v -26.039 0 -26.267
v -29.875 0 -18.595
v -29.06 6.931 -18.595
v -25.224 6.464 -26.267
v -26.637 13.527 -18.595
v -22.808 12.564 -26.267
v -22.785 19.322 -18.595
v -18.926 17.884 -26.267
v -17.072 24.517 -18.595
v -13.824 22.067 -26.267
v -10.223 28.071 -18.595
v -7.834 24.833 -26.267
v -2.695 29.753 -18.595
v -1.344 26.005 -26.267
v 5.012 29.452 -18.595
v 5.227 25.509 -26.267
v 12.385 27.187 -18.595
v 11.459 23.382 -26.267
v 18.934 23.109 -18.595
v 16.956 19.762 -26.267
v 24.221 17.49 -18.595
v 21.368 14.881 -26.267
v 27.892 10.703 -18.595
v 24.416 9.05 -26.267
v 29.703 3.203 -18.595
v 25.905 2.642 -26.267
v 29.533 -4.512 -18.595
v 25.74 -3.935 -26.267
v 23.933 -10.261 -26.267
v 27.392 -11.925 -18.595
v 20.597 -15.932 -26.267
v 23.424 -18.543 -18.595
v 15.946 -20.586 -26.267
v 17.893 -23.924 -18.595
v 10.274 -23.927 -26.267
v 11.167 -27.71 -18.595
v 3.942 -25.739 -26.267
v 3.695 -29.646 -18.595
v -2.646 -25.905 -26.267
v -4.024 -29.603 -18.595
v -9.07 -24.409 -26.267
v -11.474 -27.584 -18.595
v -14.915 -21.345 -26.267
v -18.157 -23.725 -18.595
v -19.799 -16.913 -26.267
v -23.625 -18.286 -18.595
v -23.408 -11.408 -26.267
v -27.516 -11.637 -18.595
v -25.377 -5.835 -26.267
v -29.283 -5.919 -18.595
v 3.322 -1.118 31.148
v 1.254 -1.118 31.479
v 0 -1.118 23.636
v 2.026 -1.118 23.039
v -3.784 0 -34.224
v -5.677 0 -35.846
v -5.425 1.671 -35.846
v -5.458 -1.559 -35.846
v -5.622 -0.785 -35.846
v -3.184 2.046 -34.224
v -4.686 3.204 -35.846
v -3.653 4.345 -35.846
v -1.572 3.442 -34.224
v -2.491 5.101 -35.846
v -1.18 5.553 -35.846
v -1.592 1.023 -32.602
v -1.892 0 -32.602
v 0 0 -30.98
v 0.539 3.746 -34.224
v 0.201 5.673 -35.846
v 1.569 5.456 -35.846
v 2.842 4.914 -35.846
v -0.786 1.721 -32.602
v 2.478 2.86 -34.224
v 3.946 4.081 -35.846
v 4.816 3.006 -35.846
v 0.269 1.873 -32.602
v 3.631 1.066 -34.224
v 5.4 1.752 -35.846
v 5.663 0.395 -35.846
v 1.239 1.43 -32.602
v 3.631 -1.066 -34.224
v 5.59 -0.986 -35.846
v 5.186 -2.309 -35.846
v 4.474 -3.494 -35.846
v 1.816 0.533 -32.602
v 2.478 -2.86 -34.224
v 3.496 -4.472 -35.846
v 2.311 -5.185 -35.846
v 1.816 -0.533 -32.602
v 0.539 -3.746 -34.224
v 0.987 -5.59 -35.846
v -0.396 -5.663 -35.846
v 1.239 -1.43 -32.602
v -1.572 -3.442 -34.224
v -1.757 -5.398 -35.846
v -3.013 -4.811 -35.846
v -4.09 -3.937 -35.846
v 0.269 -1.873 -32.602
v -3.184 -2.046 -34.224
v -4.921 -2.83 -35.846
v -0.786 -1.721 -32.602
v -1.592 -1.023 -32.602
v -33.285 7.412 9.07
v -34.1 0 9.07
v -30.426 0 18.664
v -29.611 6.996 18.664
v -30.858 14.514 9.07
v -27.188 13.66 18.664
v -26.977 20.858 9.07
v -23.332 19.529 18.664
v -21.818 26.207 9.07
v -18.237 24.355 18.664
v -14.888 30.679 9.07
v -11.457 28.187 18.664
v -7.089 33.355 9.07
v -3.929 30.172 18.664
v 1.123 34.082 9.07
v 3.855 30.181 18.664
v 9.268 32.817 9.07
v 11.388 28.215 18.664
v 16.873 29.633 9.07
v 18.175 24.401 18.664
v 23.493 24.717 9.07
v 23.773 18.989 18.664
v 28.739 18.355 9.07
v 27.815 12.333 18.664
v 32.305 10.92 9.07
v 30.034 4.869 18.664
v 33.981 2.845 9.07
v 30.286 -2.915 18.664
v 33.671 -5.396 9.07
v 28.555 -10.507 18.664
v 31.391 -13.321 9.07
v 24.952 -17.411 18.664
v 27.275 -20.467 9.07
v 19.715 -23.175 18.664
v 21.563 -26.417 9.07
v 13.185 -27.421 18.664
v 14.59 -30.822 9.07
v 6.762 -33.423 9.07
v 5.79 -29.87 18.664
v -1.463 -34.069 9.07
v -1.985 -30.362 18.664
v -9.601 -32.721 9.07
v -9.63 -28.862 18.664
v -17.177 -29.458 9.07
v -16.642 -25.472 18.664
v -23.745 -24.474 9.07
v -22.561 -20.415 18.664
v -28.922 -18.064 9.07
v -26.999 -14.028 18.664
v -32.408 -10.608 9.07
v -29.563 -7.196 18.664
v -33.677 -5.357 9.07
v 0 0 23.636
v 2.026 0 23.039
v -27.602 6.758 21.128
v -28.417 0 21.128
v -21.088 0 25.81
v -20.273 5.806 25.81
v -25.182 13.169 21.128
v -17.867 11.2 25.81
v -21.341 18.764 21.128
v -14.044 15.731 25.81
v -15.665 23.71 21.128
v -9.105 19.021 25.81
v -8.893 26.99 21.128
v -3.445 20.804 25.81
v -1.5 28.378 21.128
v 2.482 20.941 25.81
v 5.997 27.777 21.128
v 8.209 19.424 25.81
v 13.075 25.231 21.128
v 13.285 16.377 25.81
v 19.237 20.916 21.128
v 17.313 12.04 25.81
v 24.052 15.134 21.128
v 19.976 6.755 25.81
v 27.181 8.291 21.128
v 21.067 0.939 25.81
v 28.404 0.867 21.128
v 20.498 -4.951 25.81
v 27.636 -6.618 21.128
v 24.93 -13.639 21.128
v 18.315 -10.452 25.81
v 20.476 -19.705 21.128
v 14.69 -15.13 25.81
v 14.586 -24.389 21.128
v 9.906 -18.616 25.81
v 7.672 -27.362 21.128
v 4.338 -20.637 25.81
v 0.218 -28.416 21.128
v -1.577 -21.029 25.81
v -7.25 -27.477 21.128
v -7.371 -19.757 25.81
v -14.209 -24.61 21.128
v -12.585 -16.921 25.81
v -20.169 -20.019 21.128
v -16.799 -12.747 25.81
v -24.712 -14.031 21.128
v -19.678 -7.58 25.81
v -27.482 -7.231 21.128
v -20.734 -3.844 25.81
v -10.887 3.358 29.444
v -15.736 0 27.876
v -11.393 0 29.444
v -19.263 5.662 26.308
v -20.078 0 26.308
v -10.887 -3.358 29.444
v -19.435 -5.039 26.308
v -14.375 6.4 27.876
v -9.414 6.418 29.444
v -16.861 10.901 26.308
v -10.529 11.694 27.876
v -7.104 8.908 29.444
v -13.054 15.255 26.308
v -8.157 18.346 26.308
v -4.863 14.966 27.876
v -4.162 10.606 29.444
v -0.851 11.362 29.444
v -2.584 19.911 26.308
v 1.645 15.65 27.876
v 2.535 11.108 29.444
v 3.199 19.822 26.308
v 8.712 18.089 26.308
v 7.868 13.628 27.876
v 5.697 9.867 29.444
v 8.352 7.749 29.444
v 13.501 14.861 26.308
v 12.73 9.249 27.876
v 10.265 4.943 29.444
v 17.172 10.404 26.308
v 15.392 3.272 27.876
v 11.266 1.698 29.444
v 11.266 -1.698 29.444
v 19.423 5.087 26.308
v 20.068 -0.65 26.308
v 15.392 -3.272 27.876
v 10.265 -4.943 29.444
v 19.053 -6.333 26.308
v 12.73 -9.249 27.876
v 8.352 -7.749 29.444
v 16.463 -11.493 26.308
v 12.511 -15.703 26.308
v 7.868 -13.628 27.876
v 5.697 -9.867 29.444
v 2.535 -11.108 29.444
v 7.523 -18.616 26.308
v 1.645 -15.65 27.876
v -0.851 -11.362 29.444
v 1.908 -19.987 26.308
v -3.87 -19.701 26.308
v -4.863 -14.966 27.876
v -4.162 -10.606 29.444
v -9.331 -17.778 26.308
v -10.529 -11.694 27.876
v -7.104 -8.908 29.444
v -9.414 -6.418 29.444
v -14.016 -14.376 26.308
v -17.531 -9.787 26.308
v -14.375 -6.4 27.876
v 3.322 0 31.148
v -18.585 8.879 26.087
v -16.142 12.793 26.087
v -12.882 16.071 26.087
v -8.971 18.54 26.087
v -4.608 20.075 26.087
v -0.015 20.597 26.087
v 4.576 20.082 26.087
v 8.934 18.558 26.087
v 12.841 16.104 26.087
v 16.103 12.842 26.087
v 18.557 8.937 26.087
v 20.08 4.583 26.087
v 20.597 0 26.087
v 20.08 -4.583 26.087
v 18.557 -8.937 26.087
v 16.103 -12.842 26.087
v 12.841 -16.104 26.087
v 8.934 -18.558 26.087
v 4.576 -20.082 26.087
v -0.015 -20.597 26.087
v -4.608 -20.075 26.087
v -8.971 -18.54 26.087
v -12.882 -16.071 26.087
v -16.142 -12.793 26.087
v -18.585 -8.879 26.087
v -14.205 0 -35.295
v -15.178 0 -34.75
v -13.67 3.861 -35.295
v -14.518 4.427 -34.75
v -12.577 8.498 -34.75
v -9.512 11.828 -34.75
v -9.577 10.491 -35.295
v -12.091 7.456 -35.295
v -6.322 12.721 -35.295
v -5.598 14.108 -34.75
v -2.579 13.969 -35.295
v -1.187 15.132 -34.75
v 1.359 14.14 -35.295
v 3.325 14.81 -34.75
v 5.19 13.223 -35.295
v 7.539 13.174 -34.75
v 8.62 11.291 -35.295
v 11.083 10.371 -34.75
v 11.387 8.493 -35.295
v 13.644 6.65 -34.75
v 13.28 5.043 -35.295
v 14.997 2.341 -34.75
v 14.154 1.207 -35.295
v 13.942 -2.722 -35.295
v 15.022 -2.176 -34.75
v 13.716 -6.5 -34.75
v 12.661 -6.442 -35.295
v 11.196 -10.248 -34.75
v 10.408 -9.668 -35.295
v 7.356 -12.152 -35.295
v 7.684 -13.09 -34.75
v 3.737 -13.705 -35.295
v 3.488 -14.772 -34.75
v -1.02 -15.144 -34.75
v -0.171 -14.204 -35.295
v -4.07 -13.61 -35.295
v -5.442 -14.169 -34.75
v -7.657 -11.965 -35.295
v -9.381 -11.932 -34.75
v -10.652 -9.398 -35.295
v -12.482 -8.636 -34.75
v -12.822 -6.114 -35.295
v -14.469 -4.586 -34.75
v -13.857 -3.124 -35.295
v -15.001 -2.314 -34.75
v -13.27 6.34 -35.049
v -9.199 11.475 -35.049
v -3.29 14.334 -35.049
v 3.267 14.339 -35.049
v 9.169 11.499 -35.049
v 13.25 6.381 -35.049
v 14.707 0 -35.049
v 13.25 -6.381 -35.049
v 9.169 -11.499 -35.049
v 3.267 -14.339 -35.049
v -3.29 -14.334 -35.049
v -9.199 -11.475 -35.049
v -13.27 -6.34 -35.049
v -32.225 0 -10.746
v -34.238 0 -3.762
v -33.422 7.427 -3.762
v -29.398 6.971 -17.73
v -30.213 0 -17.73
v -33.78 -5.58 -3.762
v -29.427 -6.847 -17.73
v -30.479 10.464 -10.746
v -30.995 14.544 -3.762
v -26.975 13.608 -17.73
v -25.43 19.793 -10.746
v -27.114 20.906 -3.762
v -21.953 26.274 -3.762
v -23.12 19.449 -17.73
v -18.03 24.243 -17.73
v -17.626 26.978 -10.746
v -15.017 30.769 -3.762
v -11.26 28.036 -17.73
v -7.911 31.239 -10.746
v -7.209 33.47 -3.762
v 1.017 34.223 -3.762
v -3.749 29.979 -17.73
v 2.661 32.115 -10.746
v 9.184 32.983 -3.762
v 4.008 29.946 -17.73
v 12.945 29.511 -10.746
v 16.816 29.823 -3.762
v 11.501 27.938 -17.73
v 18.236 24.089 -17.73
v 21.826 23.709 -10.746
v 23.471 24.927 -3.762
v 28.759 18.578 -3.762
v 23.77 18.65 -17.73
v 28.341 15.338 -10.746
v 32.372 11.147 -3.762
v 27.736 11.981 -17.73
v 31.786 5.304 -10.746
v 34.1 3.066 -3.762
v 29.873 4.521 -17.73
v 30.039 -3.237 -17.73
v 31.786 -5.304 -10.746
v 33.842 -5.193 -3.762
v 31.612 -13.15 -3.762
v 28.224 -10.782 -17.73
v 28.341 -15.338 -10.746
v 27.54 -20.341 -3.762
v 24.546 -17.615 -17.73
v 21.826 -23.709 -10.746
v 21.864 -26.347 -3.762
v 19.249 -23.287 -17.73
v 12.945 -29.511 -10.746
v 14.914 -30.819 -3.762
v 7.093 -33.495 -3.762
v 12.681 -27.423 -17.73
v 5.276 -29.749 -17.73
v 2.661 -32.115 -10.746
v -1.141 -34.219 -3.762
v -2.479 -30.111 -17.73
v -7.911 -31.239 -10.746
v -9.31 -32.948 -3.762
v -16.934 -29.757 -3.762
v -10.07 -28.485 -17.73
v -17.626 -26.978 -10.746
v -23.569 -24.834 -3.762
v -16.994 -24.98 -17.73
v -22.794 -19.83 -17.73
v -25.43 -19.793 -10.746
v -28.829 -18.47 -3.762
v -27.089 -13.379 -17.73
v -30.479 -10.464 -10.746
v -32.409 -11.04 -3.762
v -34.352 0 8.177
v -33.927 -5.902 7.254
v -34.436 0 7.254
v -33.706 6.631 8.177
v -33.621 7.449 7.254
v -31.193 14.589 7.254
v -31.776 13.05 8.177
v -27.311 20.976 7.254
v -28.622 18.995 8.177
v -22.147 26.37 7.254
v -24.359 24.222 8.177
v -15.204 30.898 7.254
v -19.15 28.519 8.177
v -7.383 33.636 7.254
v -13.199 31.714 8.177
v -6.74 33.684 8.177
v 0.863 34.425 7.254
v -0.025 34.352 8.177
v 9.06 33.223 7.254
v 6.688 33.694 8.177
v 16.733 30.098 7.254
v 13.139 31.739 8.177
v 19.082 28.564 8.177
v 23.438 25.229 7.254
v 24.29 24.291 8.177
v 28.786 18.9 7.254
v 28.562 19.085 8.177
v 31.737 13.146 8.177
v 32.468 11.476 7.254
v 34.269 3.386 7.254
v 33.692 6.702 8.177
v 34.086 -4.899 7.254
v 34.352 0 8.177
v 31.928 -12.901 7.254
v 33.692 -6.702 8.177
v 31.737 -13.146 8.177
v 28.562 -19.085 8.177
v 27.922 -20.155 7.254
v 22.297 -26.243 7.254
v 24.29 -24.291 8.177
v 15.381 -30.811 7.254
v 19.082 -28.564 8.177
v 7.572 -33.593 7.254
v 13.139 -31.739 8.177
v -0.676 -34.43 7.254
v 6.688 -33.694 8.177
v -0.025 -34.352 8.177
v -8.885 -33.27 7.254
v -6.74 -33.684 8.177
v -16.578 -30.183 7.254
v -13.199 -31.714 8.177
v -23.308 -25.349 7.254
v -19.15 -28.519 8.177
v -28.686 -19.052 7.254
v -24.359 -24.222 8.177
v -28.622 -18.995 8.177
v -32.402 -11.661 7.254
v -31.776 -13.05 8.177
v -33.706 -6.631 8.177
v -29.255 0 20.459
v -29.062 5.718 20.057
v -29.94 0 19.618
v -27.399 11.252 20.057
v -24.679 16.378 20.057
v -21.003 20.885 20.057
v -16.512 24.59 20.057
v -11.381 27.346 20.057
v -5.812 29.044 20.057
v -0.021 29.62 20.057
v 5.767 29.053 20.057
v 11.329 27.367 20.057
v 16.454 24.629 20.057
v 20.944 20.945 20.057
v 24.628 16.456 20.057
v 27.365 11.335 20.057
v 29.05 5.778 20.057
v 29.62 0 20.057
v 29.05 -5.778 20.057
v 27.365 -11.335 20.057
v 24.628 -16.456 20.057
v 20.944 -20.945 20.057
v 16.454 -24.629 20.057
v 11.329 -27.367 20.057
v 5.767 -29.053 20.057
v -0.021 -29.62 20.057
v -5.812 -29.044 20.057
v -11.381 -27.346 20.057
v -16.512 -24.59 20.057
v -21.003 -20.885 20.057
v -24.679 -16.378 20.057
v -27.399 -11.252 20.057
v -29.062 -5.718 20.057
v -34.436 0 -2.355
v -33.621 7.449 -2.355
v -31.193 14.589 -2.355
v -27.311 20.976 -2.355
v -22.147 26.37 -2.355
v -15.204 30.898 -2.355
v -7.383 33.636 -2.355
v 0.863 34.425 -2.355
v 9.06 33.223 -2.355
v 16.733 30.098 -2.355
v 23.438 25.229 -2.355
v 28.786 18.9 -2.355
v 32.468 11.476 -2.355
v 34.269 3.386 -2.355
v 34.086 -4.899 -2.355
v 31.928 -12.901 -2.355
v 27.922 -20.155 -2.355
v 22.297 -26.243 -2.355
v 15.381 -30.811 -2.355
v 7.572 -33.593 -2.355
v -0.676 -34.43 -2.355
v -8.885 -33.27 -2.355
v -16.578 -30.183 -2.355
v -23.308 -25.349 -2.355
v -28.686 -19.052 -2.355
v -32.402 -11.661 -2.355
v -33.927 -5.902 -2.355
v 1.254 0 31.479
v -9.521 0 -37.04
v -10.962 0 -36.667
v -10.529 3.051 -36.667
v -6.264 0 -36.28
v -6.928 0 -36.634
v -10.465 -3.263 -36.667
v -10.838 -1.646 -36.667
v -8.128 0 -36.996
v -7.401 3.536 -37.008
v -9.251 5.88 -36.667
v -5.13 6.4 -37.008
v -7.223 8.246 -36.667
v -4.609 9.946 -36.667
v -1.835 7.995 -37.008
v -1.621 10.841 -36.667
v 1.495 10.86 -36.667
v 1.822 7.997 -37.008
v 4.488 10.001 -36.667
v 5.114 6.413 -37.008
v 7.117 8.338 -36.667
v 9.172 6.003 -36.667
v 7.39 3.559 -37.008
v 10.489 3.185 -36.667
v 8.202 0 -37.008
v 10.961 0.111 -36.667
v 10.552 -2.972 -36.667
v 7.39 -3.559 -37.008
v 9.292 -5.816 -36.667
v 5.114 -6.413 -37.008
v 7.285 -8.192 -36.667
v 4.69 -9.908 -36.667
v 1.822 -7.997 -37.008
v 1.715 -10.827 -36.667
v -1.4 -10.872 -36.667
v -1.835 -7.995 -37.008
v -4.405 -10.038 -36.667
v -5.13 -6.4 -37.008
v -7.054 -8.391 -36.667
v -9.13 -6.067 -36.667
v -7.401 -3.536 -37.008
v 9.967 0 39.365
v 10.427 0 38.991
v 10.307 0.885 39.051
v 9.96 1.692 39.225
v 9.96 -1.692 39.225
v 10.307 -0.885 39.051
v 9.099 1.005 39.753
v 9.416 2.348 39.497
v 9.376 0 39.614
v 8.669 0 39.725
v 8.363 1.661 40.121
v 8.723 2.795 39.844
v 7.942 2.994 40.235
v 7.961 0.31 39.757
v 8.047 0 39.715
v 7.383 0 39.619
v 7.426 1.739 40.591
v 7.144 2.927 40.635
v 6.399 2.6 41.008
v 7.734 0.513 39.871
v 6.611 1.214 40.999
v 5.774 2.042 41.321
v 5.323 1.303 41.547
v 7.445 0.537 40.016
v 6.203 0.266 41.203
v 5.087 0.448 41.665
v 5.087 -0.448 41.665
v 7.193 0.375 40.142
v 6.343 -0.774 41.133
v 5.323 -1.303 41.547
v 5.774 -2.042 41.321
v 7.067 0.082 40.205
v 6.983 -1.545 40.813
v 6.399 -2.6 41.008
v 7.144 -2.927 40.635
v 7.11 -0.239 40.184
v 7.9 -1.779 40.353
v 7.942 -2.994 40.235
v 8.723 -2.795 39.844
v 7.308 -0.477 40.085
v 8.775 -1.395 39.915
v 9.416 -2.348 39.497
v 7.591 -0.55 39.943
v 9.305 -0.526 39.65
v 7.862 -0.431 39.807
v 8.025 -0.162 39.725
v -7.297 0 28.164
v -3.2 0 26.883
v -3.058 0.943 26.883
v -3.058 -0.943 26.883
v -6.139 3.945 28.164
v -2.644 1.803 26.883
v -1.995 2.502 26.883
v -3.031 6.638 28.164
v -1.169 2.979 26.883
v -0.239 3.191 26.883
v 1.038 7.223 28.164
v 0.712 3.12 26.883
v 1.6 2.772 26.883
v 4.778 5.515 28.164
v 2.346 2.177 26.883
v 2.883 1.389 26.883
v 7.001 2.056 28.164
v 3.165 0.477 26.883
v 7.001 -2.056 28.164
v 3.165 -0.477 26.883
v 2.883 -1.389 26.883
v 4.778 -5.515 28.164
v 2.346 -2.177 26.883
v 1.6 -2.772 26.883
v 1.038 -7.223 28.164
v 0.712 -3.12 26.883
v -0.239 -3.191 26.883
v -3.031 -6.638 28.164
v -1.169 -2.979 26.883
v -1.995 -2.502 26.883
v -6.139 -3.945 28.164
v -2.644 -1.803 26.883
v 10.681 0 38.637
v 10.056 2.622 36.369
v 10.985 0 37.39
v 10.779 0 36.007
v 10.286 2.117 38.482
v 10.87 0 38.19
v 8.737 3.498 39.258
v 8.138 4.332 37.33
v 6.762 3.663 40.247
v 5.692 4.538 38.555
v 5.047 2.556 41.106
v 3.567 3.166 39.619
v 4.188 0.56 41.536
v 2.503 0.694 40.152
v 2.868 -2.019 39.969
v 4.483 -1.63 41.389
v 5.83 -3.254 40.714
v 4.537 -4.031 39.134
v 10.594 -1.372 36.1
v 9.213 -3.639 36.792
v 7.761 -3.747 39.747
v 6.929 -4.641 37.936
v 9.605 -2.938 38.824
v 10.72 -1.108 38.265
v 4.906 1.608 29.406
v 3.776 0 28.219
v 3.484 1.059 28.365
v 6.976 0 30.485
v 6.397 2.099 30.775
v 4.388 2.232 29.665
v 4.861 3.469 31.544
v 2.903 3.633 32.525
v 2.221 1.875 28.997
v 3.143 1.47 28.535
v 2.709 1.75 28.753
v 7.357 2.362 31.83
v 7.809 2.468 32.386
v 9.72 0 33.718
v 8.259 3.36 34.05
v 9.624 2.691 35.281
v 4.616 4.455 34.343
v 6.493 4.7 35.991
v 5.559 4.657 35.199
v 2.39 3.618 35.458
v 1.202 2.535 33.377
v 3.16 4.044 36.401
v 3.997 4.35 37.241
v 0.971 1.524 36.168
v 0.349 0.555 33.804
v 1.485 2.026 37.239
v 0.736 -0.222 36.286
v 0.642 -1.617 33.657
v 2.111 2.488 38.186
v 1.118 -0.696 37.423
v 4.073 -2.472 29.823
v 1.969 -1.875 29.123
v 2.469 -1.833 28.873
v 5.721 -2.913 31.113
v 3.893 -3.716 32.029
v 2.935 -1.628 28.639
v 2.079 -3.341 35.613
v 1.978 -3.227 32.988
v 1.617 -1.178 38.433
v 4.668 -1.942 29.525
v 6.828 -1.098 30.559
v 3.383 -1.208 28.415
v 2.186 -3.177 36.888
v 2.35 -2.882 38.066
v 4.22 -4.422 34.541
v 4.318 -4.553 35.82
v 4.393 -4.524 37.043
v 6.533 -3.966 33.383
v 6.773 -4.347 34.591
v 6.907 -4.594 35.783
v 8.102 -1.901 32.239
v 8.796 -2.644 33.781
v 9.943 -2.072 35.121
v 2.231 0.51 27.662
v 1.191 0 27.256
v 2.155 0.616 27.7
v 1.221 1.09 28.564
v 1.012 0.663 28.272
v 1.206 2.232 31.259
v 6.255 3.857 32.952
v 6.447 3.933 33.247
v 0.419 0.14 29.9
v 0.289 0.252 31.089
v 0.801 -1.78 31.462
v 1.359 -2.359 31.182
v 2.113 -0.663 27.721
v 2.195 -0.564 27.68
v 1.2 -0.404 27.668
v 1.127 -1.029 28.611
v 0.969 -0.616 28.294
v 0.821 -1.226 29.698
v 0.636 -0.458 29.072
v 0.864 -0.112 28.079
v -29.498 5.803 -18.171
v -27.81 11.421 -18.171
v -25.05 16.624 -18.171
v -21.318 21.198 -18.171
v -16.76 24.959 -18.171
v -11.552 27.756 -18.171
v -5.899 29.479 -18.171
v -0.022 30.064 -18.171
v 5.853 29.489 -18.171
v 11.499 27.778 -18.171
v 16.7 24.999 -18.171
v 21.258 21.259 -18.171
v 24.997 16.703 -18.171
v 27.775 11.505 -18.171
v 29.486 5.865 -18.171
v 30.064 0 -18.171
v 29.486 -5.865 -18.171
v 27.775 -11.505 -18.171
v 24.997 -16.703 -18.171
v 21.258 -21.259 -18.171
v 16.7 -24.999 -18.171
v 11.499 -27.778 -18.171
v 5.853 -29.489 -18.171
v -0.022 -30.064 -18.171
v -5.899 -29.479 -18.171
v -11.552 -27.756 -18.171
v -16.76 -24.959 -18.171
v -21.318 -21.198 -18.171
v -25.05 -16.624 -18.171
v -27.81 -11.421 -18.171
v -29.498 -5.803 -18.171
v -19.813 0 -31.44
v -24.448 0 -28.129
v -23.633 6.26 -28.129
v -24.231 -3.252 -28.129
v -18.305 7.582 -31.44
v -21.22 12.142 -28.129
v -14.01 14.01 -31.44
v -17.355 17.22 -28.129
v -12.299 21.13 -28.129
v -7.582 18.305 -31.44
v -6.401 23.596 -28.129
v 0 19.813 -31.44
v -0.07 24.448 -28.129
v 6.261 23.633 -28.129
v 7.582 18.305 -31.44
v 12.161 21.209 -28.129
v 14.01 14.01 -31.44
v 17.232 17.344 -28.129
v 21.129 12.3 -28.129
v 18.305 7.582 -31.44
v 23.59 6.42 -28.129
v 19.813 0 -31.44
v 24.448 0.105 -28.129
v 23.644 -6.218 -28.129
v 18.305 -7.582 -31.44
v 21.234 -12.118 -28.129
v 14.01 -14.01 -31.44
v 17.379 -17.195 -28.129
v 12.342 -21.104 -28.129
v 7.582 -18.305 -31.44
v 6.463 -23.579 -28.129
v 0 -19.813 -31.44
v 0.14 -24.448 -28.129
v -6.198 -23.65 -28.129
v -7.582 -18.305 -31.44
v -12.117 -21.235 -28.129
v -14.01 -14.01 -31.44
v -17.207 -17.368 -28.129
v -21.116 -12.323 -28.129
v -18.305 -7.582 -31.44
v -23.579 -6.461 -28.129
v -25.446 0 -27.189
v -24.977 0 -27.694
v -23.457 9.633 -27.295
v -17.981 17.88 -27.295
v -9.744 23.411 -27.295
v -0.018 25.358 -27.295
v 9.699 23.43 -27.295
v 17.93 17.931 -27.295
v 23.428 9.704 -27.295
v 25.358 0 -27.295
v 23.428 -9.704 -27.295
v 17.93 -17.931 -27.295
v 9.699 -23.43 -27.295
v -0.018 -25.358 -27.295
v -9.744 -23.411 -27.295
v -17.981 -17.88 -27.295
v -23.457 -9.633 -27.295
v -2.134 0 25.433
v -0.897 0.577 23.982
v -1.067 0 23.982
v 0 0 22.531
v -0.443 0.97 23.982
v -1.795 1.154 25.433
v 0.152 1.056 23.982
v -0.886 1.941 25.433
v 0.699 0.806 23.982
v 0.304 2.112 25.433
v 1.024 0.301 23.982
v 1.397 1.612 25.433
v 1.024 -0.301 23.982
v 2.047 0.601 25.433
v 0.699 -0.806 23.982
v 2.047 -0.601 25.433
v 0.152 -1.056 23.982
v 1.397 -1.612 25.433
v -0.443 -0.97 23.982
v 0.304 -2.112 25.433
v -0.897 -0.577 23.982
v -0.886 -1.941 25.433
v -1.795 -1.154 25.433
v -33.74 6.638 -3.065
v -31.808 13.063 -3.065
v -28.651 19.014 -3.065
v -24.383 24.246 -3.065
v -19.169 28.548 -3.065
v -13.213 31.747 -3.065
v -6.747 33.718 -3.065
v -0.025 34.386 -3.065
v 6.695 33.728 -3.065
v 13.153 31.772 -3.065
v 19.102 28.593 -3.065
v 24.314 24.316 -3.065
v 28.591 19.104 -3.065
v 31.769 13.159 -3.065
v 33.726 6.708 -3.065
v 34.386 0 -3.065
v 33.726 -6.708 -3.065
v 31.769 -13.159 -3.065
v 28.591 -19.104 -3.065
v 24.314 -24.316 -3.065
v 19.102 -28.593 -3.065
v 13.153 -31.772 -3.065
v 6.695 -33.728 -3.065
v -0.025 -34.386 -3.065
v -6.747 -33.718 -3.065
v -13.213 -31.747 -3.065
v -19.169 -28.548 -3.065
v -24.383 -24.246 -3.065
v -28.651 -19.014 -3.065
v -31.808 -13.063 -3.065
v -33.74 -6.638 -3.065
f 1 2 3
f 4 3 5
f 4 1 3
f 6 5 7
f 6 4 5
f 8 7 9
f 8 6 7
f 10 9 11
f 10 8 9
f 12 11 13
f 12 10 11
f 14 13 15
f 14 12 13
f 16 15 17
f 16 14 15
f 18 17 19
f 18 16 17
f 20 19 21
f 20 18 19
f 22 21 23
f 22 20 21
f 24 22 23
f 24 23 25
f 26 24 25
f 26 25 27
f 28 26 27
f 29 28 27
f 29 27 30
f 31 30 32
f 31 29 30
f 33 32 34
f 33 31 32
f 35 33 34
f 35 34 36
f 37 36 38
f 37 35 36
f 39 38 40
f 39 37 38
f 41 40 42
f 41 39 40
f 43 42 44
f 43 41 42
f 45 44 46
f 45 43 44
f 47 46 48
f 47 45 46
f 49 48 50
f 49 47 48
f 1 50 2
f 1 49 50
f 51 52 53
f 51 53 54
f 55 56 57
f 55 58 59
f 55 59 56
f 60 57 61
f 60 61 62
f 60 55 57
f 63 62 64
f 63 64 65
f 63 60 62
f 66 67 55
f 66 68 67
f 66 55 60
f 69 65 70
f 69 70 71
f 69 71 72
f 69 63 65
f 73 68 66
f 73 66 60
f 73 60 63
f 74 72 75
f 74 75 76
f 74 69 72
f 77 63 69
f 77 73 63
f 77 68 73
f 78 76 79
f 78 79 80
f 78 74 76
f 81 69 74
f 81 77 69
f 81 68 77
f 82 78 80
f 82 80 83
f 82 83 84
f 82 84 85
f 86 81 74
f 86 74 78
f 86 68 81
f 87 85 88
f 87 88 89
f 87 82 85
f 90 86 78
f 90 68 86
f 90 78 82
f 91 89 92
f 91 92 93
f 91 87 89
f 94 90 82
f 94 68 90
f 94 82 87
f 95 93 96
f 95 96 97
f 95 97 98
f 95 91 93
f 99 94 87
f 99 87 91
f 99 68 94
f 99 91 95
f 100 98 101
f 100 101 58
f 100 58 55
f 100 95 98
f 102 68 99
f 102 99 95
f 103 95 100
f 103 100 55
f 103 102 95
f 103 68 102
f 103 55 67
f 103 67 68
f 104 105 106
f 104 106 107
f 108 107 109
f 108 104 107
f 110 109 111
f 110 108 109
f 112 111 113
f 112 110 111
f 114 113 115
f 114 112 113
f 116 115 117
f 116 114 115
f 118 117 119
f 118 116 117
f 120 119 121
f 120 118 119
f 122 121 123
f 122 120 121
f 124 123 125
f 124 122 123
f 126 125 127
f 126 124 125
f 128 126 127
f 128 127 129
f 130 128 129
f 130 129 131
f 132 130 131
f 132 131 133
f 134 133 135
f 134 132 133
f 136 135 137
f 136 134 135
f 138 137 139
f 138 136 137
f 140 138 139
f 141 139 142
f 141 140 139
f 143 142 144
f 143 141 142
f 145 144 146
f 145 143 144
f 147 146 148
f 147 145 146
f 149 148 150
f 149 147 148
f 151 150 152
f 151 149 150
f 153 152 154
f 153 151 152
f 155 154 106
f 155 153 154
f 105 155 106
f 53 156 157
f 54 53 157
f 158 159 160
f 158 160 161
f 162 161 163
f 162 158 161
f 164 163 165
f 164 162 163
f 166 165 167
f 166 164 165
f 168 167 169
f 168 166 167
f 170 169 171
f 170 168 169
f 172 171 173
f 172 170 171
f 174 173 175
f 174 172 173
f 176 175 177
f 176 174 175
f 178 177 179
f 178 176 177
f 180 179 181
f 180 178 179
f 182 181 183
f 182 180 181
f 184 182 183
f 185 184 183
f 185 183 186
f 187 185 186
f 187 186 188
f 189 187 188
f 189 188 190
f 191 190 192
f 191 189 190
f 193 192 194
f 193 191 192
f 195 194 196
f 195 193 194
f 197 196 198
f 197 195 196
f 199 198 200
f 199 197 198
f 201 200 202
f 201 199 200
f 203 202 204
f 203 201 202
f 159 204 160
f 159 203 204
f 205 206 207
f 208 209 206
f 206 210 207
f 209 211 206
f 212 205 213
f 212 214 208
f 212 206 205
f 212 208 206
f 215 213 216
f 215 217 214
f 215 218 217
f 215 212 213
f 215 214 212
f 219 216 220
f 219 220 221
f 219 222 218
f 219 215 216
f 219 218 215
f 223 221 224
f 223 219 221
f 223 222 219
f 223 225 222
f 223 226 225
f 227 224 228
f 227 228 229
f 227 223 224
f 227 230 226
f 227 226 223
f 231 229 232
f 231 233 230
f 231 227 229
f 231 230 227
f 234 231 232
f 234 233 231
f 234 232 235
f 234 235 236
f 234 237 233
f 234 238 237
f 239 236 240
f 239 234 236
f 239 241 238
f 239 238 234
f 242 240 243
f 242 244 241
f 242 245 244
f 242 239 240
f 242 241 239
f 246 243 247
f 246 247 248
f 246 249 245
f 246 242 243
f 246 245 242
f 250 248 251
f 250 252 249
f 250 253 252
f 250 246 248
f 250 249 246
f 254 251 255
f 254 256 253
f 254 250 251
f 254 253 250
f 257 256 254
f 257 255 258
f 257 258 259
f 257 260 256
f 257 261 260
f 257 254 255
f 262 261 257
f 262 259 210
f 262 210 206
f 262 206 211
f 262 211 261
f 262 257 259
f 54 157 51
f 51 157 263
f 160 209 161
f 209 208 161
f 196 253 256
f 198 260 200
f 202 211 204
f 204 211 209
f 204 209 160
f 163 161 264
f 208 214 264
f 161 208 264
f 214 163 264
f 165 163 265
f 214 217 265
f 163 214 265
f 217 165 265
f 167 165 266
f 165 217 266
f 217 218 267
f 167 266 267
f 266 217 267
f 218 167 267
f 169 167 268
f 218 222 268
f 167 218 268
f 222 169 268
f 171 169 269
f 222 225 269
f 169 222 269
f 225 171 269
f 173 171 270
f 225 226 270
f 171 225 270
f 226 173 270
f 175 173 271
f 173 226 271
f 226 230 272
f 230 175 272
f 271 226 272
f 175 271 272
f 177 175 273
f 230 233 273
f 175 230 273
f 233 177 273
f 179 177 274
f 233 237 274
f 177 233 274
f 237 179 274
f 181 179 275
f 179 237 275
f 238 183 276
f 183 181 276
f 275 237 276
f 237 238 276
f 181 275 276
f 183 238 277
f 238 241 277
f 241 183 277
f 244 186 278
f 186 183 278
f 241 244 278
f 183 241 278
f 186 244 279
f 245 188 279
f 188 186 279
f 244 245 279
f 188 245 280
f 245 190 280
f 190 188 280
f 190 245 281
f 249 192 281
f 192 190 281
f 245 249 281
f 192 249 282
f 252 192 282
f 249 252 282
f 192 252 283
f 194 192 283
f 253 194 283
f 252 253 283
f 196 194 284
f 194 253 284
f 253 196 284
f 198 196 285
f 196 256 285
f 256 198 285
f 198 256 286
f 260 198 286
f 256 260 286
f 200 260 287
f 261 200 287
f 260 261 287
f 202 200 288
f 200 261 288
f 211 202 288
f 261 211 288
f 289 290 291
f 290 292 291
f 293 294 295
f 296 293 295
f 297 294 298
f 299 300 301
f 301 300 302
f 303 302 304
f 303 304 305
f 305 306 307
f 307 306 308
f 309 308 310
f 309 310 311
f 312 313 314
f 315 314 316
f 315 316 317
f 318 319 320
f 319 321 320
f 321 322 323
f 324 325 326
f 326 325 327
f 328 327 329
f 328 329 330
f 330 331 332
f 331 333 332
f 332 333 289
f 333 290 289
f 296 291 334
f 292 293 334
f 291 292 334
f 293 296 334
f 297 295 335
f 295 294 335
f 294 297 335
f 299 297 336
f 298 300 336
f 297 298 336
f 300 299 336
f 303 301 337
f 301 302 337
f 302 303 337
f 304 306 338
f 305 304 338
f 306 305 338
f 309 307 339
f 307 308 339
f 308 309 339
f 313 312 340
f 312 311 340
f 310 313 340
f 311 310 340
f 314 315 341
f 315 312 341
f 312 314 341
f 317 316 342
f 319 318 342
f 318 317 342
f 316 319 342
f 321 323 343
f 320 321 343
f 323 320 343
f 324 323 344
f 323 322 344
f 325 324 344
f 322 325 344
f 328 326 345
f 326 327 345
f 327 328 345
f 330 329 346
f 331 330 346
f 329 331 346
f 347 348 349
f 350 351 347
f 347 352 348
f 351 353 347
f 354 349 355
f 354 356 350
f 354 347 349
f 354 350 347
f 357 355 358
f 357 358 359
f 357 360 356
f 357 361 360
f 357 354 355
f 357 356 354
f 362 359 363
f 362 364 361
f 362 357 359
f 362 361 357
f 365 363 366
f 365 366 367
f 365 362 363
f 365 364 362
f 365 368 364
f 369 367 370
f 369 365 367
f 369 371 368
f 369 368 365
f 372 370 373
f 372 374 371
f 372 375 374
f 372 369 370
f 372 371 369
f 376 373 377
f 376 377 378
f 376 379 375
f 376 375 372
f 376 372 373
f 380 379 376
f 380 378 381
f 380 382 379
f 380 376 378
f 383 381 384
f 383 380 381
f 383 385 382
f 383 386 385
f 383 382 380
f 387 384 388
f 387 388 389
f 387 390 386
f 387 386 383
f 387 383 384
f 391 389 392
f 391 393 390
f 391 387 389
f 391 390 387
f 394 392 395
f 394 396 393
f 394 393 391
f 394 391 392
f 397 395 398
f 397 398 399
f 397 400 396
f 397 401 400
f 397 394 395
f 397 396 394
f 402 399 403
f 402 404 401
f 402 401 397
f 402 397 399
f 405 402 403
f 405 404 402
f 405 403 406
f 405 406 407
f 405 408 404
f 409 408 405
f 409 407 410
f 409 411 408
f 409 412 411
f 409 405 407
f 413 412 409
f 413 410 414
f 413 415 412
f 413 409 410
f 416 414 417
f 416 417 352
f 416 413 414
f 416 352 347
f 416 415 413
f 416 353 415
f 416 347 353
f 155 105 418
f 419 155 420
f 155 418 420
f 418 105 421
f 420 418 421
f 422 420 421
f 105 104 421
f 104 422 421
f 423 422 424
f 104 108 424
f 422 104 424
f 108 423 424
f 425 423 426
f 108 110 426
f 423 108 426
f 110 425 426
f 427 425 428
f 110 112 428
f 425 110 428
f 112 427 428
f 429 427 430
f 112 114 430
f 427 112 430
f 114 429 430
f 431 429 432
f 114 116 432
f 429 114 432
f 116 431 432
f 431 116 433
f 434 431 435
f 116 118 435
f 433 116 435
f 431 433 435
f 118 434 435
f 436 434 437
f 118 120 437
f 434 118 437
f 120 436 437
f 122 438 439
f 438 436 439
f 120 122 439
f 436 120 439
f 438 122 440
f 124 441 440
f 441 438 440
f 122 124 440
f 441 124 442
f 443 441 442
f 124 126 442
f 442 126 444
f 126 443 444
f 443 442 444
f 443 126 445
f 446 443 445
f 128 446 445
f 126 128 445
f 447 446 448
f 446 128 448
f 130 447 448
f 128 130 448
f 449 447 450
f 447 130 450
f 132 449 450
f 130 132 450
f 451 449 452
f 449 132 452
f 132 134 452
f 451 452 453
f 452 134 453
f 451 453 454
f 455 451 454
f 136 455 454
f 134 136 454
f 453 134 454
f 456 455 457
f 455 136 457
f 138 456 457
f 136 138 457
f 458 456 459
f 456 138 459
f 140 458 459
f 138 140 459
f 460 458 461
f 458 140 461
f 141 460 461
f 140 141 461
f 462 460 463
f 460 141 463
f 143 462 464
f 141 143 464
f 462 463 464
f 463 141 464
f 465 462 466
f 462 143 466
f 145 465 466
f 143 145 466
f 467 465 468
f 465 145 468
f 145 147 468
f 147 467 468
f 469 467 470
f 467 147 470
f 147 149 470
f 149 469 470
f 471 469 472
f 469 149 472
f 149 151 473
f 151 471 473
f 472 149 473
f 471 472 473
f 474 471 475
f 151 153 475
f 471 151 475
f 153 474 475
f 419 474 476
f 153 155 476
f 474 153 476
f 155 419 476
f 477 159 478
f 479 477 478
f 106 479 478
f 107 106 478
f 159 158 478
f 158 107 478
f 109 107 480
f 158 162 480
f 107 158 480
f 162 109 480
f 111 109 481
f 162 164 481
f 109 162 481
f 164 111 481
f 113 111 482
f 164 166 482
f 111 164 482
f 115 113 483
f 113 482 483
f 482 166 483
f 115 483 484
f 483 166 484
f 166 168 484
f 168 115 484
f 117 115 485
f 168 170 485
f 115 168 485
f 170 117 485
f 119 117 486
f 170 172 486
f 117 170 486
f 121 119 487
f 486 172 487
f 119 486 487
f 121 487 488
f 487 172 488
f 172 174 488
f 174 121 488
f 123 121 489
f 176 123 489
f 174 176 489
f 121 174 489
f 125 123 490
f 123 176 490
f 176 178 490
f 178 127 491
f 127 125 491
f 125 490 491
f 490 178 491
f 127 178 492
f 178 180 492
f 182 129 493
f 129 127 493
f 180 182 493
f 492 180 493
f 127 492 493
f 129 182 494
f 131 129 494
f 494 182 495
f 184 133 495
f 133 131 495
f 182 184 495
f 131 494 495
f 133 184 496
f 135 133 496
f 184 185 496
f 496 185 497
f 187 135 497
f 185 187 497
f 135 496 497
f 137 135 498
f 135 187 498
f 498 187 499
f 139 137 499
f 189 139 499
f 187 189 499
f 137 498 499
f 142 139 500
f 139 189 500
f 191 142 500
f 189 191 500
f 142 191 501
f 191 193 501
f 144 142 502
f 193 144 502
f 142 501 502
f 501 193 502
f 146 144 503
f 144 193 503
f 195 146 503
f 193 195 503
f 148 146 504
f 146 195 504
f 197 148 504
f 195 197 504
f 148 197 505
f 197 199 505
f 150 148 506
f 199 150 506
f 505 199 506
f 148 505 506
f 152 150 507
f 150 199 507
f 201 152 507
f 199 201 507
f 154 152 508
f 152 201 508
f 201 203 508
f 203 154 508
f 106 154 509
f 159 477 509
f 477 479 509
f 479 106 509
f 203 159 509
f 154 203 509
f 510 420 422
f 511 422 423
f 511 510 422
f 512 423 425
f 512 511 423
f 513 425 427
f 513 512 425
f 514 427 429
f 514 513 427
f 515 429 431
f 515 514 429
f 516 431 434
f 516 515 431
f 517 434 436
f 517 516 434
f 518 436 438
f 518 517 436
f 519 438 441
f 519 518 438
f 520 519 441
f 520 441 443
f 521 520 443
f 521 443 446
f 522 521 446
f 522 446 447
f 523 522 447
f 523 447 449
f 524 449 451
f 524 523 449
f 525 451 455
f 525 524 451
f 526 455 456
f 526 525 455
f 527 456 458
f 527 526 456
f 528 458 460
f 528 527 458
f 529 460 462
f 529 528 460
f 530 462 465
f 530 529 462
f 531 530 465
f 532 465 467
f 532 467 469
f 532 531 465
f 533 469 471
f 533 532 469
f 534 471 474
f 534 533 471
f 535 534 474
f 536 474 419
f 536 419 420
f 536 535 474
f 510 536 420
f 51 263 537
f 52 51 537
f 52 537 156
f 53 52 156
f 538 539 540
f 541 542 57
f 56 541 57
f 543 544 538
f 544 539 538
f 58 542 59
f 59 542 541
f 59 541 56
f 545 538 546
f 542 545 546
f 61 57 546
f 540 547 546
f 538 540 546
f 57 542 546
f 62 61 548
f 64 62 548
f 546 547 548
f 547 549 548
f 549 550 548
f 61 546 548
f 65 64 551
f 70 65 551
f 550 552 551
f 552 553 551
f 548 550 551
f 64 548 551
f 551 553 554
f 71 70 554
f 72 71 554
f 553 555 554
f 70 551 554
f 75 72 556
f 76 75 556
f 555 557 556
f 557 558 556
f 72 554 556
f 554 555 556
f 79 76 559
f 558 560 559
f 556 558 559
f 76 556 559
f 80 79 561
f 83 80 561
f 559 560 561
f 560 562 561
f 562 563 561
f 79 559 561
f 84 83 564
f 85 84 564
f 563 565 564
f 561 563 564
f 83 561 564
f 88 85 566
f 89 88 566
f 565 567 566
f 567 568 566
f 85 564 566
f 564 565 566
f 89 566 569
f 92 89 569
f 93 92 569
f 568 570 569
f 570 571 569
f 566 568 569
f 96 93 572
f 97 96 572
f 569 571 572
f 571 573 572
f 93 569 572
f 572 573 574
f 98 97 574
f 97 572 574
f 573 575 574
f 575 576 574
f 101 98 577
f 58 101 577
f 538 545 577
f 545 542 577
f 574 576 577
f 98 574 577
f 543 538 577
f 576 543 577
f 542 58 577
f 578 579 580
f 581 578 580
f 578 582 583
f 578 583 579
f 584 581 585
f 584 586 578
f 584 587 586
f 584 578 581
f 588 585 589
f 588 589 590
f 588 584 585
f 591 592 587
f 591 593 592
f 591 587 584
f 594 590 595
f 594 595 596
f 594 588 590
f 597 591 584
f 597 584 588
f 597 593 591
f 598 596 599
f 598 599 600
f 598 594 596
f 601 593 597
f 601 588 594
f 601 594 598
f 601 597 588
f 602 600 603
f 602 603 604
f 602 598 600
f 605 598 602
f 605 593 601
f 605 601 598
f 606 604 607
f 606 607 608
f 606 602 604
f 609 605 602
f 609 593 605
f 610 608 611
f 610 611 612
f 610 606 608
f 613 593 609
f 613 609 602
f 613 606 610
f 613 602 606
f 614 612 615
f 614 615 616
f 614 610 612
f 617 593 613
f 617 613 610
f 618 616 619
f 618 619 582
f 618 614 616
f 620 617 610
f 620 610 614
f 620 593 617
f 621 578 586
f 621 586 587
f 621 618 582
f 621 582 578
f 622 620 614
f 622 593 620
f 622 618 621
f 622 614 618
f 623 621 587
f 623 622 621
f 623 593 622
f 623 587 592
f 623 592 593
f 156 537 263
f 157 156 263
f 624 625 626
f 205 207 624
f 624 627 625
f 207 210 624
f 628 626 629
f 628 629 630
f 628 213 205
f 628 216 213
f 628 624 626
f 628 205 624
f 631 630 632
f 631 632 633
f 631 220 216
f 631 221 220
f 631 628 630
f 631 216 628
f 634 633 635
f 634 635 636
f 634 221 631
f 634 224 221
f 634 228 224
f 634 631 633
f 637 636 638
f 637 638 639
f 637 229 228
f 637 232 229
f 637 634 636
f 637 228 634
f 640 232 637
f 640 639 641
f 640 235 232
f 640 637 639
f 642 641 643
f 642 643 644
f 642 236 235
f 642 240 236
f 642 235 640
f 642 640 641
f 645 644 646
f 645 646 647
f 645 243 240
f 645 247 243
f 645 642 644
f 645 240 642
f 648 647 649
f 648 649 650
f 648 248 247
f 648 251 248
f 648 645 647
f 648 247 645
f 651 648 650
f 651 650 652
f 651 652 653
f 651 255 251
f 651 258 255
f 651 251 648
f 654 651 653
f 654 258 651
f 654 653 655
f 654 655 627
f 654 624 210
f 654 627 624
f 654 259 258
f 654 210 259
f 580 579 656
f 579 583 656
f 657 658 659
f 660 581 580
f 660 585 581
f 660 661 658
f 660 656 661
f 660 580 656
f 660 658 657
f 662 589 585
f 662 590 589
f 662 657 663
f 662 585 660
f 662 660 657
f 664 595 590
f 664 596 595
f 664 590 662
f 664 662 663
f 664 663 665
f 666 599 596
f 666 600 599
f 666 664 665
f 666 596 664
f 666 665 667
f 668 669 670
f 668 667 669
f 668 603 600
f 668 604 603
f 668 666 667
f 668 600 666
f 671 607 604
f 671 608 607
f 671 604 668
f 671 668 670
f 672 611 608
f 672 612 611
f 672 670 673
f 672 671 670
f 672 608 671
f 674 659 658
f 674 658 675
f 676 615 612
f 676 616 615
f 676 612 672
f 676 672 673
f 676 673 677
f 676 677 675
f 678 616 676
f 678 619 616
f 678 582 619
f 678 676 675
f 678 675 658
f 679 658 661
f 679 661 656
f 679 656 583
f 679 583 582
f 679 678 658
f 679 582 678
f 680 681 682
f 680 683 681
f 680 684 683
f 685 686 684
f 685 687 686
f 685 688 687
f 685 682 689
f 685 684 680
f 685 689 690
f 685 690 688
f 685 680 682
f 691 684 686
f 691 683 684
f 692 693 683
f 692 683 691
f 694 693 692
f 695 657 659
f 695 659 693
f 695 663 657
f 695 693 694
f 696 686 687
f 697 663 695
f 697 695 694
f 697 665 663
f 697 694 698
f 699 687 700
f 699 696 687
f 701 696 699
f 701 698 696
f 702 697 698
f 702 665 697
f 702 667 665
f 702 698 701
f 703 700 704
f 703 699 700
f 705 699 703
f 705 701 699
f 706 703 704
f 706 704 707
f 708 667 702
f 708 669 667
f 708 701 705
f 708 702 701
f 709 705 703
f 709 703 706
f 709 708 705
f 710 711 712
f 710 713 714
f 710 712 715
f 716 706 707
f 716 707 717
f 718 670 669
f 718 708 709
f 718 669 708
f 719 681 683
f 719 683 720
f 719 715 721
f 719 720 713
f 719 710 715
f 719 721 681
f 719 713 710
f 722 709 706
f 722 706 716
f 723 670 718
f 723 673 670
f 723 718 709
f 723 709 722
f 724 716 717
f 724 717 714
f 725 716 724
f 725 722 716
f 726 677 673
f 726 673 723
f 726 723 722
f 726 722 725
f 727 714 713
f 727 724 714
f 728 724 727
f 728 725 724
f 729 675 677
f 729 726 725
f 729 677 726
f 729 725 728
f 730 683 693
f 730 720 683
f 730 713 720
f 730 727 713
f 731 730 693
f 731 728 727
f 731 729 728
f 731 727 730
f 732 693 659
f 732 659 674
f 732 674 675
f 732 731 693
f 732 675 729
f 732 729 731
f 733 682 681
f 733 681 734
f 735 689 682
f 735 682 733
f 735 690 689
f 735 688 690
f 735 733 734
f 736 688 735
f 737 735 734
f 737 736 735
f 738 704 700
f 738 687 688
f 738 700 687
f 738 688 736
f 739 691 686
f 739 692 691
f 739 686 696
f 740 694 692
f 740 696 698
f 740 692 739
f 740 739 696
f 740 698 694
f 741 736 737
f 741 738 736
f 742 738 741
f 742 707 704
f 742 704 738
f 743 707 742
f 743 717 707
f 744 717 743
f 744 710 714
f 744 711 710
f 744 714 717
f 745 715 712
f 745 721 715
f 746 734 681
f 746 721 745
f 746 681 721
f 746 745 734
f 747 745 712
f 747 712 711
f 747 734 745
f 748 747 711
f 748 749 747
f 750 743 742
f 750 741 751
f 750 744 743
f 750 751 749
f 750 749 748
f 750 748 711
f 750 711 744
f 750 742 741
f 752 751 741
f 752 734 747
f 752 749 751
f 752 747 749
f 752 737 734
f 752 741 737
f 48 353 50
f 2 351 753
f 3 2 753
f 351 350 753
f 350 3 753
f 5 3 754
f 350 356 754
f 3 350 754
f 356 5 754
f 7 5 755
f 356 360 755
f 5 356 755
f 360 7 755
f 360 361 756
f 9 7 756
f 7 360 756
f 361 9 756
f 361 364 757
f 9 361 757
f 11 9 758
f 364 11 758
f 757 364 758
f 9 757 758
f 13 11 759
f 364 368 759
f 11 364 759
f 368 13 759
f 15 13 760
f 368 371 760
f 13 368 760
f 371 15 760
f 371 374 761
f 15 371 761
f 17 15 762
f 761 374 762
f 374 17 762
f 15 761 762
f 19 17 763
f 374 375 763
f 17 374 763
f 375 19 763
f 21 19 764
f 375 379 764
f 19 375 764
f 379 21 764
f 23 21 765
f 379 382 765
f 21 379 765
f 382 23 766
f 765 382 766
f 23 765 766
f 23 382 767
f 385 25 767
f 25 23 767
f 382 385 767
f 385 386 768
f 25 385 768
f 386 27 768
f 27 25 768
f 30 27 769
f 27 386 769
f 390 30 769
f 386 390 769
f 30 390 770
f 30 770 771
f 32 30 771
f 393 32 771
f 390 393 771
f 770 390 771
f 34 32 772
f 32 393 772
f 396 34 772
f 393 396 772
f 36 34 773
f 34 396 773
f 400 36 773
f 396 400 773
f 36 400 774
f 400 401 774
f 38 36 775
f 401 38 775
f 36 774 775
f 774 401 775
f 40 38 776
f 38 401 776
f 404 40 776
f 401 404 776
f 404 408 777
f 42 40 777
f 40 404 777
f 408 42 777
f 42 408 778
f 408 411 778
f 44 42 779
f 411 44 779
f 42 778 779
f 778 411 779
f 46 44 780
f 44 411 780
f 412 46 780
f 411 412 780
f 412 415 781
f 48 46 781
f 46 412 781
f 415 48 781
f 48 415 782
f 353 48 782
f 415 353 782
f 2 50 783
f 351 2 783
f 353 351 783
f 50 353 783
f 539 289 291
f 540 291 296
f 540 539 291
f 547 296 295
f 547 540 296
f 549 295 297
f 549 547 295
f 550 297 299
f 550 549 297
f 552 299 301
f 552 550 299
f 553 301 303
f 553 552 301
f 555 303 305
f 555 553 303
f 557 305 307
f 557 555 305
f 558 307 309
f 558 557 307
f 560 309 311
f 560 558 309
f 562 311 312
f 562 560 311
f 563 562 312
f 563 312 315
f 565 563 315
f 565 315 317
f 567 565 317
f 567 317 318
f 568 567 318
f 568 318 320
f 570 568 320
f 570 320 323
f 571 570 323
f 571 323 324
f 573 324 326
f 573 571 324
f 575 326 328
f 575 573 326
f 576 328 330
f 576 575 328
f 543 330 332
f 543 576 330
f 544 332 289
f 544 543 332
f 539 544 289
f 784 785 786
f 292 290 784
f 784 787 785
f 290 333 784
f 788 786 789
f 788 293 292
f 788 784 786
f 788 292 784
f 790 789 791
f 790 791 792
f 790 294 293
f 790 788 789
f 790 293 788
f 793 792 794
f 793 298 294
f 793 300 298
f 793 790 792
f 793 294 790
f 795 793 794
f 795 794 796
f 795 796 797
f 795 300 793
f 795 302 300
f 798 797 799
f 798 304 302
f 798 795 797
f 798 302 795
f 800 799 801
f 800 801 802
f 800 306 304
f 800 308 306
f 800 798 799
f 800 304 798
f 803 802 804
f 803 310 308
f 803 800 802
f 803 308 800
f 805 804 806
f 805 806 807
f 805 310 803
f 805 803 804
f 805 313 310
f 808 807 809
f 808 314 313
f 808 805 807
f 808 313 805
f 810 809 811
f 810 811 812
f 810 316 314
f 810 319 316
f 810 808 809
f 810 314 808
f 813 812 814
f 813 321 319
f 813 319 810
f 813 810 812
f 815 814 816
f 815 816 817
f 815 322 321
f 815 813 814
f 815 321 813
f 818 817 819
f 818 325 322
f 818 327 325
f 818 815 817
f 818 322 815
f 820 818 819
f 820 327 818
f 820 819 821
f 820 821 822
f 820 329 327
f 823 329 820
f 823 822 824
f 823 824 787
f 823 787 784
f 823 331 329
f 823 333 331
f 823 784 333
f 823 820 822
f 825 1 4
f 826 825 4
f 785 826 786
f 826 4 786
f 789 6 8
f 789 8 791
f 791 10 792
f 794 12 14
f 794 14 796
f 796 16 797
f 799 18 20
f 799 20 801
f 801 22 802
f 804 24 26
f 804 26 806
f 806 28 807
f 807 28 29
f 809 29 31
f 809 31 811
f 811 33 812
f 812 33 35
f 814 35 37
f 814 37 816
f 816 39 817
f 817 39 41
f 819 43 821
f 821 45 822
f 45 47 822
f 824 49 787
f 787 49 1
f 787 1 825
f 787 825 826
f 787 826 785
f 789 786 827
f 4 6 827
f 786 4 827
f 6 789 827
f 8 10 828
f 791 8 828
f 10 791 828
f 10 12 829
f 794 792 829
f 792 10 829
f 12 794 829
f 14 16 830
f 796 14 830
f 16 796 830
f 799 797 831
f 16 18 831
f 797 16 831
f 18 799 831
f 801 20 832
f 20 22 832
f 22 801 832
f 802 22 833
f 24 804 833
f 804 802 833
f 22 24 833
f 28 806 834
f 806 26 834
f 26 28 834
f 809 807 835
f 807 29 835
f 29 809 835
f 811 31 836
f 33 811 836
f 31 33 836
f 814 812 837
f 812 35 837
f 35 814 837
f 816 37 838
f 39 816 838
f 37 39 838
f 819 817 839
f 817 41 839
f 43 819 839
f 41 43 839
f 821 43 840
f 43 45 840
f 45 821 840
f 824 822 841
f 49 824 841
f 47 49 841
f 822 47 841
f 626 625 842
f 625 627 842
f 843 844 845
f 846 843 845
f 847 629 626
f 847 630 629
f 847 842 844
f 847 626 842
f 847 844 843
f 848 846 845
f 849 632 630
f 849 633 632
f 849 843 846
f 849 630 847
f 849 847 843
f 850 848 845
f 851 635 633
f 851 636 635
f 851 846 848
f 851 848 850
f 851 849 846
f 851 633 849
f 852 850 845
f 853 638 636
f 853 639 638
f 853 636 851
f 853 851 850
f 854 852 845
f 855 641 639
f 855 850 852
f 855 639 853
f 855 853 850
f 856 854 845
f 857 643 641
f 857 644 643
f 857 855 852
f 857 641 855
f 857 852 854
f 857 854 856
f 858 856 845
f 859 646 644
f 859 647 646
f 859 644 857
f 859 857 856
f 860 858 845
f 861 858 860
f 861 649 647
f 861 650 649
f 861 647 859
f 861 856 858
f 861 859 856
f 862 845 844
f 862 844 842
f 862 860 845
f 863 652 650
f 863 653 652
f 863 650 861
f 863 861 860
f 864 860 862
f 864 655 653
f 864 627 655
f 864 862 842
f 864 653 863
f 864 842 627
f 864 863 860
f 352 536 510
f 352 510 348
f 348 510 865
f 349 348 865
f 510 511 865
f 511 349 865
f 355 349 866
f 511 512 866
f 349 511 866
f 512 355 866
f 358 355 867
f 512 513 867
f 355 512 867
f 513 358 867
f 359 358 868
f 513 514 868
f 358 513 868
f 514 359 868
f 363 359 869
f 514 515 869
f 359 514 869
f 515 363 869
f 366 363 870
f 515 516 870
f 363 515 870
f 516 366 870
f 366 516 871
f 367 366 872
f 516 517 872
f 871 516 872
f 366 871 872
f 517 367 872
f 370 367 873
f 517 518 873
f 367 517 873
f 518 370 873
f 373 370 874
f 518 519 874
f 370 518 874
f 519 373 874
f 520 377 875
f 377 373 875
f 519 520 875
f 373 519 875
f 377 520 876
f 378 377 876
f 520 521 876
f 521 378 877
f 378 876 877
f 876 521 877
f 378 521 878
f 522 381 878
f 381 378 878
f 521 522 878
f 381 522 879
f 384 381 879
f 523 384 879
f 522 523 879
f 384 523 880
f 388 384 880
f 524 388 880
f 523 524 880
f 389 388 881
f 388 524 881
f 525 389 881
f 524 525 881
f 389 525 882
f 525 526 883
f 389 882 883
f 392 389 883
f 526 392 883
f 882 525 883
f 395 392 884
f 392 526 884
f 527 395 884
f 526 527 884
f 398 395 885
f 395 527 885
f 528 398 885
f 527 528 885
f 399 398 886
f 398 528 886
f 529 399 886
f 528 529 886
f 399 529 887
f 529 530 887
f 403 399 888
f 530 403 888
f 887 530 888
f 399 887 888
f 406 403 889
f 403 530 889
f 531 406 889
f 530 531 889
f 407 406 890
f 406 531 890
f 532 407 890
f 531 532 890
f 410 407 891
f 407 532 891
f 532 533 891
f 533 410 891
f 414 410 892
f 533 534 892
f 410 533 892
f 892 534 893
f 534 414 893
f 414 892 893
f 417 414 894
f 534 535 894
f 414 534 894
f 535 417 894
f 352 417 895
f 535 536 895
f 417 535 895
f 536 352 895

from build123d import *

# Parameters (mm, degrees)
F2_R      = 4.8247887854
F6_R      = 5.08
F10_DEPTH = 1.1176


with BuildPart() as f1:
    # F0 (on Front) → F1 (revolve)
    with BuildSketch(Plane.XZ):
        Polygon((0, -30.7238399982), (0, 22.2747847438), (-8.32104031, 30.4678082466), (-21.6347035021, 20.2265270054), (-31.8759828806, 10.7533438131), (-31.8759828806, -6.4007998444), (-20.8666082472, -26.8833599985), (-6.2727844343, -35.5884470046), align=None)
    revolve(axis=Axis((0, 0, -4.2245276272), (0, 0, -1)))

    # F2
    f2_edges = [f1.edges().sort_by_distance(p)[0] for p in [
        (31.875983, 0, -6.4008),
        (20.866608, 0, -26.88336),
        (-26.371296, 0, -16.64208),
        (21.634704, 0, 20.226527),
        (31.875983, 0, 10.753344),
        (-26.755343, 0, 15.489935),
        (8.32104, 0, 30.467808),
        (-14.977872, 0, 25.347168),
        (6.272784, 0, -35.588447),
        (-13.569696, 0, -31.235904),
    ]]
    fillet(f2_edges, radius=F2_R)


with BuildPart() as f5:
    # F4 (on Front) → F5 (revolve)
    with BuildSketch(Plane.XZ):
        Polygon((0, -30.9798717499), (0, 22.5308164954), (-3.2004006207, 26.8833599985), (-11.3934241235, 29.4436812401), (-20.6105764955, 26.1152647436), (-29.8277288675, 20.2265270054), (-34.4363041222, 8.1930235028), (-34.4363041222, -3.0723842792), (-30.0837606192, -18.1782729924), (-25.4751835018, -27.3954253644), (-14.7218396887, -35.0763835013), (-8.065007627, -37.8927364945), align=None)
    revolve(axis=Axis((0, 0, -4.2245276272), (0, 0, -1)))

    # F6
    f6_edges = [f5.edges().sort_by_distance(p)[0] for p in [
        (20.610576, 0, 26.115265),
        (29.827729, 0, 20.226527),
        (-25.219153, 0, 23.170896),
        (34.436304, 0, 8.193024),
        (-32.132016, 0, 14.209775),
        (34.436304, 0, -3.072384),
        (-34.436304, 0, 2.56032),
        (30.083761, 0, -18.178273),
        (-32.260032, 0, -10.625329),
        (25.475184, 0, -27.395425),
        (-27.779472, 0, -22.786849),
        (14.72184, 0, -35.076384),
        (-20.098512, 0, -31.235904),
        (8.065008, 0, -37.892736),
        (-11.393424, 0, -36.48456),
    ]]
    fillet(f6_edges, radius=F6_R)


with BuildPart() as f8:
    # F7 (on Front) → F8 (revolve)
    with BuildSketch(Plane.XZ):
        with BuildLine():
            Line((4.2871795595, 33.4377028048), (1.1912591128, 27.2559621202))
            add(Edge.make_bspline(
                [(1.1912591128, 27.2559621202), (18.0131662302, 30.6038983688), (10.4266675189, 38.9910824597)],
                knots=[3.8204950948, 3.8204950948, 3.8204950948, 6.2831853072, 6.2831853072, 6.2831853072], degree=2, weights=[1, 0.3329696776, 1]))
            add(Edge.make_bspline(
                [(10.4266675189, 38.9910824597), (9.4806810758, 40.0369090983), (7.3831000062, 39.6194434894)],
                knots=[0, 0, 0, 0.6789024412, 0.6789024412, 0.6789024412], degree=2, weights=[1, 0.9429375344, 1]))
            Line((7.3831000062, 39.6194434894), (4.2871795595, 33.4377028048))
        make_face()
    revolve(axis=Axis((3.6915500031, 0, 32.2483868889), (0.4477978629, 0, 0.8941348187)))


with BuildPart() as f10:
    # F9 (on Front) → F10 (new body)
    with BuildSketch(Plane.XZ):
        Polygon((1.2537260773, 31.4786843956), (0, 23.6362311989), (2.0260354603, 23.0394498473), (3.3222998869, 31.1479938753), align=None)
    extrude(amount=F10_DEPTH)


solid = Compound([f5.part, f8.part, f10.part])
